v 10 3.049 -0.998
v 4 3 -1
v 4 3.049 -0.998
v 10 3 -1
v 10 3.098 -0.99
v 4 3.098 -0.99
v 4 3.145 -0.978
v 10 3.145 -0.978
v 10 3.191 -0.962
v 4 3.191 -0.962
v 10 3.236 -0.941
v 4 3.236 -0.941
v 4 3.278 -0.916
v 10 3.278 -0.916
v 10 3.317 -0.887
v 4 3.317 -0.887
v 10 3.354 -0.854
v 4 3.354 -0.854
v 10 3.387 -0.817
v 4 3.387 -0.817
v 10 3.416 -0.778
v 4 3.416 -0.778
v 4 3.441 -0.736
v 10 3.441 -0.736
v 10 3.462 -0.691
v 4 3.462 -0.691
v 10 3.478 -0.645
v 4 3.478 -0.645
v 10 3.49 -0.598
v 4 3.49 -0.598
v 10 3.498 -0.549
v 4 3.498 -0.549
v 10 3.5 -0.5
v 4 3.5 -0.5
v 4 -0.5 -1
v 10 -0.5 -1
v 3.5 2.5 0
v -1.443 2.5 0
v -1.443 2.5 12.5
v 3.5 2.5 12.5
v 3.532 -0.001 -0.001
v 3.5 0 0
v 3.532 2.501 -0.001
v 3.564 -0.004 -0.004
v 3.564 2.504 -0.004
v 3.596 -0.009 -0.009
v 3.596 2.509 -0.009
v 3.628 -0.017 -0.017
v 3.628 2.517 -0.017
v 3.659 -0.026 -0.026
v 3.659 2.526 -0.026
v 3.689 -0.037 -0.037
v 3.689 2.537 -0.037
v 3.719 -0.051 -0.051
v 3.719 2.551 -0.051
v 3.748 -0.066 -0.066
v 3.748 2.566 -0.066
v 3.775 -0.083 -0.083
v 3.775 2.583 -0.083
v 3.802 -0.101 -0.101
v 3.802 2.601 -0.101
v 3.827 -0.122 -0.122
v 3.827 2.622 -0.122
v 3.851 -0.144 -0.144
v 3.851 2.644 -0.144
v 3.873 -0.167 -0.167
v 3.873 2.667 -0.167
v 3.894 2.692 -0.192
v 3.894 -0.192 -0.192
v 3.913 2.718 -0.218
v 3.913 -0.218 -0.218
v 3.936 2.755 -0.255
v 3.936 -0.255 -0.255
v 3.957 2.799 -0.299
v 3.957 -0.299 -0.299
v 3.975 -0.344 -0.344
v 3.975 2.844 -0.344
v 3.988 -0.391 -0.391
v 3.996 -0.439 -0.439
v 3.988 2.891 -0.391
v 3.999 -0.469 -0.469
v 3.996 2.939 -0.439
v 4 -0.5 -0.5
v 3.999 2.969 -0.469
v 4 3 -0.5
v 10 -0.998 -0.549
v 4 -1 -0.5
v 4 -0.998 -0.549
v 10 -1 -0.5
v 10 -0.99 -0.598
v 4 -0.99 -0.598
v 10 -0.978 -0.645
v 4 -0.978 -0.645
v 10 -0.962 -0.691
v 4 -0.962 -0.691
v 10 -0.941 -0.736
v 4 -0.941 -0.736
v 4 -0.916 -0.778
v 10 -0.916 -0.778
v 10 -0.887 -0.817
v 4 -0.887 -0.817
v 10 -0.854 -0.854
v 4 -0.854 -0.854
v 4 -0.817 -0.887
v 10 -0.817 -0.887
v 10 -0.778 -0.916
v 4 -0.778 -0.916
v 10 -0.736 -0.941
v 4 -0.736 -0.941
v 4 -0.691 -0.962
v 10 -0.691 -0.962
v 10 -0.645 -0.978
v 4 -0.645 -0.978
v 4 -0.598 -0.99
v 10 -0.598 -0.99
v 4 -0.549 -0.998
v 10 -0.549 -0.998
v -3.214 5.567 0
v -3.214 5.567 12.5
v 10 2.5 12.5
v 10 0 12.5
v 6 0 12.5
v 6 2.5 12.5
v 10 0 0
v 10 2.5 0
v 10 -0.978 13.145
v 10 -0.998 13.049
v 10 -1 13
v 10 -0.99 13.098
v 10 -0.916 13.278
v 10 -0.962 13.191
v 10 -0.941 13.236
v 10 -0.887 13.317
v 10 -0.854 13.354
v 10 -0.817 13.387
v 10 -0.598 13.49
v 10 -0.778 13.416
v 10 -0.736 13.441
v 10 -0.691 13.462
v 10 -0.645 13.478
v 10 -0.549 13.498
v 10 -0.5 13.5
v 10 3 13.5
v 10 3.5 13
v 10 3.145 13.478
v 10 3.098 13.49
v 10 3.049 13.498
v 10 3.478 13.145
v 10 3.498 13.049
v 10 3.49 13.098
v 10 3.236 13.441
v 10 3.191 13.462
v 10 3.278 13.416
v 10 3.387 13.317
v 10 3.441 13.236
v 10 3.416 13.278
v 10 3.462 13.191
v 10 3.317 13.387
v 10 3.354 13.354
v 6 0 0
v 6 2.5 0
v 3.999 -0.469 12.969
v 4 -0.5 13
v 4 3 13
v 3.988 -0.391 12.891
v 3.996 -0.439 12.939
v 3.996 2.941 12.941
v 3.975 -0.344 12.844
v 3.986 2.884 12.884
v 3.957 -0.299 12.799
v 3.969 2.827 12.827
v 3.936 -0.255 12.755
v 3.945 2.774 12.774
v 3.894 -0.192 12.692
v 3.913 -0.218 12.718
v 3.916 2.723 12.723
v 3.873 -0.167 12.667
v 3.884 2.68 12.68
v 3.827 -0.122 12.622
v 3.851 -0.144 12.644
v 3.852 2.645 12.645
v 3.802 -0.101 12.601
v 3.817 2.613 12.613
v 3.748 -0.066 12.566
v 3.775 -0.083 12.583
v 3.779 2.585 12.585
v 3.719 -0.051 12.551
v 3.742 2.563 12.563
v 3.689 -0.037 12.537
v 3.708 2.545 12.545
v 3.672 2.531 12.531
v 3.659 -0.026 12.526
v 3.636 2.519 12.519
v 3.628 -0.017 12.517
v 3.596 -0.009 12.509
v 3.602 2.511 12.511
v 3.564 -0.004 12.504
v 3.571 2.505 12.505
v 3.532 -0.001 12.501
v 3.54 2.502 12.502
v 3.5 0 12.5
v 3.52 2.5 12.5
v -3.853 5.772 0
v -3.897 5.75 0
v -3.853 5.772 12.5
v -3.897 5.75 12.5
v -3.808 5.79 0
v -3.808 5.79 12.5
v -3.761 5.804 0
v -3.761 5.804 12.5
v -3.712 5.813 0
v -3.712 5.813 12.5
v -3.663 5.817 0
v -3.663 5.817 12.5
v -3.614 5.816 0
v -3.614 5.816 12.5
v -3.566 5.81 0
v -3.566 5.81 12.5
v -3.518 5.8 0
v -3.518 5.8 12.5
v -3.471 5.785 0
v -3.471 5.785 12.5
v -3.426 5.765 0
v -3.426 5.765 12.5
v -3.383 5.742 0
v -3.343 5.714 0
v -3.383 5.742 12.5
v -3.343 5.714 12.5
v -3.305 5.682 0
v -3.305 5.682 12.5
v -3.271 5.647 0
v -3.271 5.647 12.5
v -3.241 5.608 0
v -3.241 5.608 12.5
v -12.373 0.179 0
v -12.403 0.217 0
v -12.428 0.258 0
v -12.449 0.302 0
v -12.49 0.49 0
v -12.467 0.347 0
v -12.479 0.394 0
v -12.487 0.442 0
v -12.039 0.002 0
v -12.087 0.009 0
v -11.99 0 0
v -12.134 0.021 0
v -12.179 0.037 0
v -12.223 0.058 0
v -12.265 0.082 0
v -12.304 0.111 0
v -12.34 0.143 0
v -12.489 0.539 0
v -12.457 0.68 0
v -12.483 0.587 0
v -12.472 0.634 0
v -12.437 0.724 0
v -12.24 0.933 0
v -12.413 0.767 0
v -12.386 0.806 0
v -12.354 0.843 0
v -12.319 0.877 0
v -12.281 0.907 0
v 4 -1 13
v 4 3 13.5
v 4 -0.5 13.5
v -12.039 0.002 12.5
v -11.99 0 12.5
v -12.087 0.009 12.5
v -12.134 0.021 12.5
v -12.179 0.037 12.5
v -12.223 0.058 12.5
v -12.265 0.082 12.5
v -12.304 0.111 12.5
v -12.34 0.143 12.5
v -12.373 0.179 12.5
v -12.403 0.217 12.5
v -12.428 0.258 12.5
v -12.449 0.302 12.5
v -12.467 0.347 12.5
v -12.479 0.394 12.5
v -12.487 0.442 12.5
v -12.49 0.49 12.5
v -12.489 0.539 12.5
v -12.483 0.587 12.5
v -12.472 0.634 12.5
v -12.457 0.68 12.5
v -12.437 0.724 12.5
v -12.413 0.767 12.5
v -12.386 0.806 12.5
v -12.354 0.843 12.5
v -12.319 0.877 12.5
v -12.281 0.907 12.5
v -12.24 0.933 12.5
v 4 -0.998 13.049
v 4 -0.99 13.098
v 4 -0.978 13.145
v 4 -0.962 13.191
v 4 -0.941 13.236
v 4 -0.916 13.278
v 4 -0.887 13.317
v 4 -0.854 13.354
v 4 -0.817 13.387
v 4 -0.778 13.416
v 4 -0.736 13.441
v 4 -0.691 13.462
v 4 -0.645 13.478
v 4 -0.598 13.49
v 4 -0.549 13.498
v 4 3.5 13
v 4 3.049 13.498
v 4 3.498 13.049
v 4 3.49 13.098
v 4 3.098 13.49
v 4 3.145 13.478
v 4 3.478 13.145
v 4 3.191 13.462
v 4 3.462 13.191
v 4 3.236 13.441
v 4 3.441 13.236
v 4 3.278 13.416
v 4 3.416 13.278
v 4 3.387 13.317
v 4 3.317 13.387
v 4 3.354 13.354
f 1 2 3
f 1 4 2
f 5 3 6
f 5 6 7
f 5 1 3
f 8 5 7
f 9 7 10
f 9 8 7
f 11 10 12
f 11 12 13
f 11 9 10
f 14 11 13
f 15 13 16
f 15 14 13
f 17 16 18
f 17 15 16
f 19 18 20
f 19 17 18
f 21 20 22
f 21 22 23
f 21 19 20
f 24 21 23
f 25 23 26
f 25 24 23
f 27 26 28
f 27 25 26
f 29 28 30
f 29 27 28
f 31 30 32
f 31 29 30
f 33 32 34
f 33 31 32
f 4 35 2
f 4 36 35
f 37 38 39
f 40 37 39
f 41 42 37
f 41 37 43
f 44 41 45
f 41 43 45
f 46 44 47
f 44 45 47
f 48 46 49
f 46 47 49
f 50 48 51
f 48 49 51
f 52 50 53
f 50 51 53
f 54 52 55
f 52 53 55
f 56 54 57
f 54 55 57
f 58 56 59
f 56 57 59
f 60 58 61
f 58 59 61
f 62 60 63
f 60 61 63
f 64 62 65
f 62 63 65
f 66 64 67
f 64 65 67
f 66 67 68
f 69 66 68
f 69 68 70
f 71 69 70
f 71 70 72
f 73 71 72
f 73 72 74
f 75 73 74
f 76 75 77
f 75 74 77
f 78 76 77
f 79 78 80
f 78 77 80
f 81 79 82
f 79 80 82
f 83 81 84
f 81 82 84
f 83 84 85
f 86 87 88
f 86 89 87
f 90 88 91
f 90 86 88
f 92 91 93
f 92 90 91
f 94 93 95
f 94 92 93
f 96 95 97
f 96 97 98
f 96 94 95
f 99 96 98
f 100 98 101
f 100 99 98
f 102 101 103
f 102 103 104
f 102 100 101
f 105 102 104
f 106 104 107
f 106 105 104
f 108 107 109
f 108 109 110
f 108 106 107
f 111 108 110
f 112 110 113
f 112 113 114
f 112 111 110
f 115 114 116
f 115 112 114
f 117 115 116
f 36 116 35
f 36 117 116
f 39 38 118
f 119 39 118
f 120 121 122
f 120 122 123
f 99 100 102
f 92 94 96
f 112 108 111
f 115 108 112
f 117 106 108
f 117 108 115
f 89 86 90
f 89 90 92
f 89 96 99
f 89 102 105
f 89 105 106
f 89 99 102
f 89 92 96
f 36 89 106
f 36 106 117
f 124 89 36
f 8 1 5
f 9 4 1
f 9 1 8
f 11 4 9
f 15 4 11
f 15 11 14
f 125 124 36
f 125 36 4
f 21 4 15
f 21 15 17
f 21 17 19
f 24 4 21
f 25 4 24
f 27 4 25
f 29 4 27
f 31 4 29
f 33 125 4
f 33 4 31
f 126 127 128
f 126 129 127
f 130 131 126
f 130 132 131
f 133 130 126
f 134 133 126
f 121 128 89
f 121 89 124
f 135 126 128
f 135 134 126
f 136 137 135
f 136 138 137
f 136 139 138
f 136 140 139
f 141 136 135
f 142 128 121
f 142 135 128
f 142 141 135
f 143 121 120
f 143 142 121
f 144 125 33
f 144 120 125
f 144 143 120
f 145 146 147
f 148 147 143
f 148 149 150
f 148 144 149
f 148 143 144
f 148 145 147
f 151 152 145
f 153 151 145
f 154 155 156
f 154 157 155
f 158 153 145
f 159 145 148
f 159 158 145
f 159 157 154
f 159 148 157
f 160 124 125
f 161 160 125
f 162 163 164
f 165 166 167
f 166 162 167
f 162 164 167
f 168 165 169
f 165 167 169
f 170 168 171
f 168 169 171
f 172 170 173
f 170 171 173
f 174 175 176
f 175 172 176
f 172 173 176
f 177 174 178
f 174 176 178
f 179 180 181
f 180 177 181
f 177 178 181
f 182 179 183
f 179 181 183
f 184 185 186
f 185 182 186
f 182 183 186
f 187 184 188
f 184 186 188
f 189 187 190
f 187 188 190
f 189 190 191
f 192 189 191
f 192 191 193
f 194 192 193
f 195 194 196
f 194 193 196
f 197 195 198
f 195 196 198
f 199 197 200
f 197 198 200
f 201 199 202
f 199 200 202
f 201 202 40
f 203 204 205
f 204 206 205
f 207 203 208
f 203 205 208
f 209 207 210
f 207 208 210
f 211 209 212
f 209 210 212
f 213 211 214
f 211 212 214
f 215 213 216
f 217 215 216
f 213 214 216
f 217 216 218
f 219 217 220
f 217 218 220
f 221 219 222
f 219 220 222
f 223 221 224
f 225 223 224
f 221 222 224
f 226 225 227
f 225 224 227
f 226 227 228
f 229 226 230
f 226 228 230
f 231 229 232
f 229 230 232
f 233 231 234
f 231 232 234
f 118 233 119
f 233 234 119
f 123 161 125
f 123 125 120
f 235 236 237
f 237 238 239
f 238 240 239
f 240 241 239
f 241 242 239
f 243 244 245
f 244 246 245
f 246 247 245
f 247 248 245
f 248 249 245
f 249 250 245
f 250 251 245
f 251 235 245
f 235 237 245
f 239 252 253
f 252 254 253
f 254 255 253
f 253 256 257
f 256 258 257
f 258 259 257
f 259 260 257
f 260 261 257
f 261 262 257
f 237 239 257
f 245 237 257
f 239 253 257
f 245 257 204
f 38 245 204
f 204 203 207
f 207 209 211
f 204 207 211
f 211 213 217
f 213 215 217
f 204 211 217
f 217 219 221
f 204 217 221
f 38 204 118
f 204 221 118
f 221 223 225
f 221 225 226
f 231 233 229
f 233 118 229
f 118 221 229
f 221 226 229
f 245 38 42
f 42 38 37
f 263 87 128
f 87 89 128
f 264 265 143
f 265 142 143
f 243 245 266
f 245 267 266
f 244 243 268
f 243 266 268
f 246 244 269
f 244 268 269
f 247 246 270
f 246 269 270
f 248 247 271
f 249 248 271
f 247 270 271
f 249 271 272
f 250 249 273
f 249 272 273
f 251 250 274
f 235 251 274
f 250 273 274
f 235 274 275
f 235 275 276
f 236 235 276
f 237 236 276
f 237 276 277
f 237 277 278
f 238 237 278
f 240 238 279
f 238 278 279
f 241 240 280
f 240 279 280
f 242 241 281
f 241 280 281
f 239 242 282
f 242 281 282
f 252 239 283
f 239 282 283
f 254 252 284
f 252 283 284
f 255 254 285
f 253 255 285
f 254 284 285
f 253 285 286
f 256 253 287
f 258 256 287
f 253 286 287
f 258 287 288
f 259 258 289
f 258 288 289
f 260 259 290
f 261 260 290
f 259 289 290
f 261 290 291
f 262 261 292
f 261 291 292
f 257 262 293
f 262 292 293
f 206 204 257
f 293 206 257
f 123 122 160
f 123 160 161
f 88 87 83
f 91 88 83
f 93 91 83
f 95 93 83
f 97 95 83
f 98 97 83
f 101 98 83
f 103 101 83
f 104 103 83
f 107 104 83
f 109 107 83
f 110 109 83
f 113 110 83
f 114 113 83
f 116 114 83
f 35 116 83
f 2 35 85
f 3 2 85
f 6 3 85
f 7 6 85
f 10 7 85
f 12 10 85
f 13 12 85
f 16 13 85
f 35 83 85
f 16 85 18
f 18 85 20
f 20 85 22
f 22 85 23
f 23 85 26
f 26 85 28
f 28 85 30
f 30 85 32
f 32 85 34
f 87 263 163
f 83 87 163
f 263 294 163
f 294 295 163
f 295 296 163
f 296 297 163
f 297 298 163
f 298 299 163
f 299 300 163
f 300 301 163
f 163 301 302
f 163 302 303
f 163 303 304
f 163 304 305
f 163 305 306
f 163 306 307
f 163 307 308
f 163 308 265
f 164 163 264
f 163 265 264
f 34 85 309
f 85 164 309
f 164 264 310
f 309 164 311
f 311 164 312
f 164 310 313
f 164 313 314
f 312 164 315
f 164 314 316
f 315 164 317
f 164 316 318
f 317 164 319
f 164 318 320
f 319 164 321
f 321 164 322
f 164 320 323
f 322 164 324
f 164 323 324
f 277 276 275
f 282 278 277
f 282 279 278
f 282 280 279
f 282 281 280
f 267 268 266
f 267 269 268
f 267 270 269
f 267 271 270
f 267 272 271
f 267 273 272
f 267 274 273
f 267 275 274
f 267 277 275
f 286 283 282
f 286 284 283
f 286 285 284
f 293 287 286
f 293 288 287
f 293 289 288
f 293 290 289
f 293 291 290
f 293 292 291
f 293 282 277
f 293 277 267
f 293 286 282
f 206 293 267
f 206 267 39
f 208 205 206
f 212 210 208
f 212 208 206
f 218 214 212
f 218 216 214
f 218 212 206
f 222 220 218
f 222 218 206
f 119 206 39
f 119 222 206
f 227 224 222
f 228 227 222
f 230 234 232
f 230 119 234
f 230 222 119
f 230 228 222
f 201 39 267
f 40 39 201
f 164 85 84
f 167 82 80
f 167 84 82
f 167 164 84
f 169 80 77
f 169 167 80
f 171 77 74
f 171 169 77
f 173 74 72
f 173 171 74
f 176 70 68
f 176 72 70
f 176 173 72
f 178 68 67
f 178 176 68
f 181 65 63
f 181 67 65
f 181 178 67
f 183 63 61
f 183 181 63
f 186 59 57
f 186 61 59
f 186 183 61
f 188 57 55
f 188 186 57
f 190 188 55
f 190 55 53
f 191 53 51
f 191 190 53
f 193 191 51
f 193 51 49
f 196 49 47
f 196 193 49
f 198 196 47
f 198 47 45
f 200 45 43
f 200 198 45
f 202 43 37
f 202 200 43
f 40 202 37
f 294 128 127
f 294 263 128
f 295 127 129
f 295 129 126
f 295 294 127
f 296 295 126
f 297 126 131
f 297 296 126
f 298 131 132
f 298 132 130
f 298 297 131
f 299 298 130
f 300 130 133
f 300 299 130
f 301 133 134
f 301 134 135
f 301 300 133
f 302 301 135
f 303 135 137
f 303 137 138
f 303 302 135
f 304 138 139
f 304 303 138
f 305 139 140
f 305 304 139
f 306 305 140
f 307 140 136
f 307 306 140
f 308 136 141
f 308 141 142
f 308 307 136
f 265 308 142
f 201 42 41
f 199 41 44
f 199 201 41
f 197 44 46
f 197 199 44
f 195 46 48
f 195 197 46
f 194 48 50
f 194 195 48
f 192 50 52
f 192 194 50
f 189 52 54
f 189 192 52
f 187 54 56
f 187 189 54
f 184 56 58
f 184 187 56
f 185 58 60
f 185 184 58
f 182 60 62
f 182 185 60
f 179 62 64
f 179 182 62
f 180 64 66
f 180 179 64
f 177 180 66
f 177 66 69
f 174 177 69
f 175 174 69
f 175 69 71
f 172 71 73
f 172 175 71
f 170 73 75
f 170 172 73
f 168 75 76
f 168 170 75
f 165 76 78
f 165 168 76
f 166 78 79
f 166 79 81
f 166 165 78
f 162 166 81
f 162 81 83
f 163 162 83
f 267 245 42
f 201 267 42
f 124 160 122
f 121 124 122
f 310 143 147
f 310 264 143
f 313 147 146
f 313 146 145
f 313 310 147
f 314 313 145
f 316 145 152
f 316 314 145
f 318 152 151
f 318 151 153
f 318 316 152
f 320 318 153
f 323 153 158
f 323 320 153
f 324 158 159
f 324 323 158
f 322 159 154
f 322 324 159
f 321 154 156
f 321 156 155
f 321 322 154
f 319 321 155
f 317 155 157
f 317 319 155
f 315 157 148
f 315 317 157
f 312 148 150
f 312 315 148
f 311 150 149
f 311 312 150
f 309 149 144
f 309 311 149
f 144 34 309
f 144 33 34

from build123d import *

# Parameters (mm, degrees)
F1_DEPTH      = 12.5
F3_W          = 2.5
F3_H          = 12.5
F4_DEPTH      = 9.464
F5_W          = 4.5
F5_H          = 14.5
F5_W_2        = 2.5
F5_H_2        = 12.5
F6_DEPTH      = 4
F6_DEPTH_BACK = 2
F7_R          = 0.5
F8_R          = 0.5


with BuildPart() as f1:
    # F0 (on Top) → F1 (new body)
    with BuildSketch(Plane.XY):
        Polygon((-13.8564064606, 0), (0, 0), (-3.4641016151, 6), align=None)
    extrude(amount=F1_DEPTH)

    # F3 (on offset) → F4 (join)
    with BuildSketch(Plane.YZ.offset(-3.4643)):
        with Locations((1.25, 6.25)):
            Rectangle(F3_W, F3_H)
    extrude(amount=F4_DEPTH)

    # F5 (on face) → F6 (join, two sides)
    with BuildSketch(Plane.YZ.offset(5.9997)) as f6_sk:
        with Locations((1.25, 6.25)):
            Rectangle(F5_W, F5_H)
        with Locations((1.25, 6.25)):
            Rectangle(F5_W_2, F5_H_2, mode=Mode.SUBTRACT)
    extrude(amount=F6_DEPTH)
    extrude(f6_sk.sketch, amount=-F6_DEPTH_BACK)

    # F7
    f7_edges = [f1.edges().sort_by_distance(p)[0] for p in [
        (-13.856406, 0, 6.25),
        (-3.464102, 6, 6.25),
    ]]
    fillet(f7_edges, radius=F7_R)

    # F8
    f8_edges = [f1.edges().sort_by_distance(p)[0] for p in [
        (3.9997, 1.25, 0),
        (3.9997, 0, 6.25),
        (3.9997, 2.5, 6.25),
        (3.9997, 1.25, 12.5),
        (6.9997, -1, 13.5),
        (6.9997, 3.5, 13.5),
        (6.9997, 3.5, -1),
        (6.9997, -1, -1),
    ]]
    fillet(f8_edges, radius=F8_R)


solid = f1.part
